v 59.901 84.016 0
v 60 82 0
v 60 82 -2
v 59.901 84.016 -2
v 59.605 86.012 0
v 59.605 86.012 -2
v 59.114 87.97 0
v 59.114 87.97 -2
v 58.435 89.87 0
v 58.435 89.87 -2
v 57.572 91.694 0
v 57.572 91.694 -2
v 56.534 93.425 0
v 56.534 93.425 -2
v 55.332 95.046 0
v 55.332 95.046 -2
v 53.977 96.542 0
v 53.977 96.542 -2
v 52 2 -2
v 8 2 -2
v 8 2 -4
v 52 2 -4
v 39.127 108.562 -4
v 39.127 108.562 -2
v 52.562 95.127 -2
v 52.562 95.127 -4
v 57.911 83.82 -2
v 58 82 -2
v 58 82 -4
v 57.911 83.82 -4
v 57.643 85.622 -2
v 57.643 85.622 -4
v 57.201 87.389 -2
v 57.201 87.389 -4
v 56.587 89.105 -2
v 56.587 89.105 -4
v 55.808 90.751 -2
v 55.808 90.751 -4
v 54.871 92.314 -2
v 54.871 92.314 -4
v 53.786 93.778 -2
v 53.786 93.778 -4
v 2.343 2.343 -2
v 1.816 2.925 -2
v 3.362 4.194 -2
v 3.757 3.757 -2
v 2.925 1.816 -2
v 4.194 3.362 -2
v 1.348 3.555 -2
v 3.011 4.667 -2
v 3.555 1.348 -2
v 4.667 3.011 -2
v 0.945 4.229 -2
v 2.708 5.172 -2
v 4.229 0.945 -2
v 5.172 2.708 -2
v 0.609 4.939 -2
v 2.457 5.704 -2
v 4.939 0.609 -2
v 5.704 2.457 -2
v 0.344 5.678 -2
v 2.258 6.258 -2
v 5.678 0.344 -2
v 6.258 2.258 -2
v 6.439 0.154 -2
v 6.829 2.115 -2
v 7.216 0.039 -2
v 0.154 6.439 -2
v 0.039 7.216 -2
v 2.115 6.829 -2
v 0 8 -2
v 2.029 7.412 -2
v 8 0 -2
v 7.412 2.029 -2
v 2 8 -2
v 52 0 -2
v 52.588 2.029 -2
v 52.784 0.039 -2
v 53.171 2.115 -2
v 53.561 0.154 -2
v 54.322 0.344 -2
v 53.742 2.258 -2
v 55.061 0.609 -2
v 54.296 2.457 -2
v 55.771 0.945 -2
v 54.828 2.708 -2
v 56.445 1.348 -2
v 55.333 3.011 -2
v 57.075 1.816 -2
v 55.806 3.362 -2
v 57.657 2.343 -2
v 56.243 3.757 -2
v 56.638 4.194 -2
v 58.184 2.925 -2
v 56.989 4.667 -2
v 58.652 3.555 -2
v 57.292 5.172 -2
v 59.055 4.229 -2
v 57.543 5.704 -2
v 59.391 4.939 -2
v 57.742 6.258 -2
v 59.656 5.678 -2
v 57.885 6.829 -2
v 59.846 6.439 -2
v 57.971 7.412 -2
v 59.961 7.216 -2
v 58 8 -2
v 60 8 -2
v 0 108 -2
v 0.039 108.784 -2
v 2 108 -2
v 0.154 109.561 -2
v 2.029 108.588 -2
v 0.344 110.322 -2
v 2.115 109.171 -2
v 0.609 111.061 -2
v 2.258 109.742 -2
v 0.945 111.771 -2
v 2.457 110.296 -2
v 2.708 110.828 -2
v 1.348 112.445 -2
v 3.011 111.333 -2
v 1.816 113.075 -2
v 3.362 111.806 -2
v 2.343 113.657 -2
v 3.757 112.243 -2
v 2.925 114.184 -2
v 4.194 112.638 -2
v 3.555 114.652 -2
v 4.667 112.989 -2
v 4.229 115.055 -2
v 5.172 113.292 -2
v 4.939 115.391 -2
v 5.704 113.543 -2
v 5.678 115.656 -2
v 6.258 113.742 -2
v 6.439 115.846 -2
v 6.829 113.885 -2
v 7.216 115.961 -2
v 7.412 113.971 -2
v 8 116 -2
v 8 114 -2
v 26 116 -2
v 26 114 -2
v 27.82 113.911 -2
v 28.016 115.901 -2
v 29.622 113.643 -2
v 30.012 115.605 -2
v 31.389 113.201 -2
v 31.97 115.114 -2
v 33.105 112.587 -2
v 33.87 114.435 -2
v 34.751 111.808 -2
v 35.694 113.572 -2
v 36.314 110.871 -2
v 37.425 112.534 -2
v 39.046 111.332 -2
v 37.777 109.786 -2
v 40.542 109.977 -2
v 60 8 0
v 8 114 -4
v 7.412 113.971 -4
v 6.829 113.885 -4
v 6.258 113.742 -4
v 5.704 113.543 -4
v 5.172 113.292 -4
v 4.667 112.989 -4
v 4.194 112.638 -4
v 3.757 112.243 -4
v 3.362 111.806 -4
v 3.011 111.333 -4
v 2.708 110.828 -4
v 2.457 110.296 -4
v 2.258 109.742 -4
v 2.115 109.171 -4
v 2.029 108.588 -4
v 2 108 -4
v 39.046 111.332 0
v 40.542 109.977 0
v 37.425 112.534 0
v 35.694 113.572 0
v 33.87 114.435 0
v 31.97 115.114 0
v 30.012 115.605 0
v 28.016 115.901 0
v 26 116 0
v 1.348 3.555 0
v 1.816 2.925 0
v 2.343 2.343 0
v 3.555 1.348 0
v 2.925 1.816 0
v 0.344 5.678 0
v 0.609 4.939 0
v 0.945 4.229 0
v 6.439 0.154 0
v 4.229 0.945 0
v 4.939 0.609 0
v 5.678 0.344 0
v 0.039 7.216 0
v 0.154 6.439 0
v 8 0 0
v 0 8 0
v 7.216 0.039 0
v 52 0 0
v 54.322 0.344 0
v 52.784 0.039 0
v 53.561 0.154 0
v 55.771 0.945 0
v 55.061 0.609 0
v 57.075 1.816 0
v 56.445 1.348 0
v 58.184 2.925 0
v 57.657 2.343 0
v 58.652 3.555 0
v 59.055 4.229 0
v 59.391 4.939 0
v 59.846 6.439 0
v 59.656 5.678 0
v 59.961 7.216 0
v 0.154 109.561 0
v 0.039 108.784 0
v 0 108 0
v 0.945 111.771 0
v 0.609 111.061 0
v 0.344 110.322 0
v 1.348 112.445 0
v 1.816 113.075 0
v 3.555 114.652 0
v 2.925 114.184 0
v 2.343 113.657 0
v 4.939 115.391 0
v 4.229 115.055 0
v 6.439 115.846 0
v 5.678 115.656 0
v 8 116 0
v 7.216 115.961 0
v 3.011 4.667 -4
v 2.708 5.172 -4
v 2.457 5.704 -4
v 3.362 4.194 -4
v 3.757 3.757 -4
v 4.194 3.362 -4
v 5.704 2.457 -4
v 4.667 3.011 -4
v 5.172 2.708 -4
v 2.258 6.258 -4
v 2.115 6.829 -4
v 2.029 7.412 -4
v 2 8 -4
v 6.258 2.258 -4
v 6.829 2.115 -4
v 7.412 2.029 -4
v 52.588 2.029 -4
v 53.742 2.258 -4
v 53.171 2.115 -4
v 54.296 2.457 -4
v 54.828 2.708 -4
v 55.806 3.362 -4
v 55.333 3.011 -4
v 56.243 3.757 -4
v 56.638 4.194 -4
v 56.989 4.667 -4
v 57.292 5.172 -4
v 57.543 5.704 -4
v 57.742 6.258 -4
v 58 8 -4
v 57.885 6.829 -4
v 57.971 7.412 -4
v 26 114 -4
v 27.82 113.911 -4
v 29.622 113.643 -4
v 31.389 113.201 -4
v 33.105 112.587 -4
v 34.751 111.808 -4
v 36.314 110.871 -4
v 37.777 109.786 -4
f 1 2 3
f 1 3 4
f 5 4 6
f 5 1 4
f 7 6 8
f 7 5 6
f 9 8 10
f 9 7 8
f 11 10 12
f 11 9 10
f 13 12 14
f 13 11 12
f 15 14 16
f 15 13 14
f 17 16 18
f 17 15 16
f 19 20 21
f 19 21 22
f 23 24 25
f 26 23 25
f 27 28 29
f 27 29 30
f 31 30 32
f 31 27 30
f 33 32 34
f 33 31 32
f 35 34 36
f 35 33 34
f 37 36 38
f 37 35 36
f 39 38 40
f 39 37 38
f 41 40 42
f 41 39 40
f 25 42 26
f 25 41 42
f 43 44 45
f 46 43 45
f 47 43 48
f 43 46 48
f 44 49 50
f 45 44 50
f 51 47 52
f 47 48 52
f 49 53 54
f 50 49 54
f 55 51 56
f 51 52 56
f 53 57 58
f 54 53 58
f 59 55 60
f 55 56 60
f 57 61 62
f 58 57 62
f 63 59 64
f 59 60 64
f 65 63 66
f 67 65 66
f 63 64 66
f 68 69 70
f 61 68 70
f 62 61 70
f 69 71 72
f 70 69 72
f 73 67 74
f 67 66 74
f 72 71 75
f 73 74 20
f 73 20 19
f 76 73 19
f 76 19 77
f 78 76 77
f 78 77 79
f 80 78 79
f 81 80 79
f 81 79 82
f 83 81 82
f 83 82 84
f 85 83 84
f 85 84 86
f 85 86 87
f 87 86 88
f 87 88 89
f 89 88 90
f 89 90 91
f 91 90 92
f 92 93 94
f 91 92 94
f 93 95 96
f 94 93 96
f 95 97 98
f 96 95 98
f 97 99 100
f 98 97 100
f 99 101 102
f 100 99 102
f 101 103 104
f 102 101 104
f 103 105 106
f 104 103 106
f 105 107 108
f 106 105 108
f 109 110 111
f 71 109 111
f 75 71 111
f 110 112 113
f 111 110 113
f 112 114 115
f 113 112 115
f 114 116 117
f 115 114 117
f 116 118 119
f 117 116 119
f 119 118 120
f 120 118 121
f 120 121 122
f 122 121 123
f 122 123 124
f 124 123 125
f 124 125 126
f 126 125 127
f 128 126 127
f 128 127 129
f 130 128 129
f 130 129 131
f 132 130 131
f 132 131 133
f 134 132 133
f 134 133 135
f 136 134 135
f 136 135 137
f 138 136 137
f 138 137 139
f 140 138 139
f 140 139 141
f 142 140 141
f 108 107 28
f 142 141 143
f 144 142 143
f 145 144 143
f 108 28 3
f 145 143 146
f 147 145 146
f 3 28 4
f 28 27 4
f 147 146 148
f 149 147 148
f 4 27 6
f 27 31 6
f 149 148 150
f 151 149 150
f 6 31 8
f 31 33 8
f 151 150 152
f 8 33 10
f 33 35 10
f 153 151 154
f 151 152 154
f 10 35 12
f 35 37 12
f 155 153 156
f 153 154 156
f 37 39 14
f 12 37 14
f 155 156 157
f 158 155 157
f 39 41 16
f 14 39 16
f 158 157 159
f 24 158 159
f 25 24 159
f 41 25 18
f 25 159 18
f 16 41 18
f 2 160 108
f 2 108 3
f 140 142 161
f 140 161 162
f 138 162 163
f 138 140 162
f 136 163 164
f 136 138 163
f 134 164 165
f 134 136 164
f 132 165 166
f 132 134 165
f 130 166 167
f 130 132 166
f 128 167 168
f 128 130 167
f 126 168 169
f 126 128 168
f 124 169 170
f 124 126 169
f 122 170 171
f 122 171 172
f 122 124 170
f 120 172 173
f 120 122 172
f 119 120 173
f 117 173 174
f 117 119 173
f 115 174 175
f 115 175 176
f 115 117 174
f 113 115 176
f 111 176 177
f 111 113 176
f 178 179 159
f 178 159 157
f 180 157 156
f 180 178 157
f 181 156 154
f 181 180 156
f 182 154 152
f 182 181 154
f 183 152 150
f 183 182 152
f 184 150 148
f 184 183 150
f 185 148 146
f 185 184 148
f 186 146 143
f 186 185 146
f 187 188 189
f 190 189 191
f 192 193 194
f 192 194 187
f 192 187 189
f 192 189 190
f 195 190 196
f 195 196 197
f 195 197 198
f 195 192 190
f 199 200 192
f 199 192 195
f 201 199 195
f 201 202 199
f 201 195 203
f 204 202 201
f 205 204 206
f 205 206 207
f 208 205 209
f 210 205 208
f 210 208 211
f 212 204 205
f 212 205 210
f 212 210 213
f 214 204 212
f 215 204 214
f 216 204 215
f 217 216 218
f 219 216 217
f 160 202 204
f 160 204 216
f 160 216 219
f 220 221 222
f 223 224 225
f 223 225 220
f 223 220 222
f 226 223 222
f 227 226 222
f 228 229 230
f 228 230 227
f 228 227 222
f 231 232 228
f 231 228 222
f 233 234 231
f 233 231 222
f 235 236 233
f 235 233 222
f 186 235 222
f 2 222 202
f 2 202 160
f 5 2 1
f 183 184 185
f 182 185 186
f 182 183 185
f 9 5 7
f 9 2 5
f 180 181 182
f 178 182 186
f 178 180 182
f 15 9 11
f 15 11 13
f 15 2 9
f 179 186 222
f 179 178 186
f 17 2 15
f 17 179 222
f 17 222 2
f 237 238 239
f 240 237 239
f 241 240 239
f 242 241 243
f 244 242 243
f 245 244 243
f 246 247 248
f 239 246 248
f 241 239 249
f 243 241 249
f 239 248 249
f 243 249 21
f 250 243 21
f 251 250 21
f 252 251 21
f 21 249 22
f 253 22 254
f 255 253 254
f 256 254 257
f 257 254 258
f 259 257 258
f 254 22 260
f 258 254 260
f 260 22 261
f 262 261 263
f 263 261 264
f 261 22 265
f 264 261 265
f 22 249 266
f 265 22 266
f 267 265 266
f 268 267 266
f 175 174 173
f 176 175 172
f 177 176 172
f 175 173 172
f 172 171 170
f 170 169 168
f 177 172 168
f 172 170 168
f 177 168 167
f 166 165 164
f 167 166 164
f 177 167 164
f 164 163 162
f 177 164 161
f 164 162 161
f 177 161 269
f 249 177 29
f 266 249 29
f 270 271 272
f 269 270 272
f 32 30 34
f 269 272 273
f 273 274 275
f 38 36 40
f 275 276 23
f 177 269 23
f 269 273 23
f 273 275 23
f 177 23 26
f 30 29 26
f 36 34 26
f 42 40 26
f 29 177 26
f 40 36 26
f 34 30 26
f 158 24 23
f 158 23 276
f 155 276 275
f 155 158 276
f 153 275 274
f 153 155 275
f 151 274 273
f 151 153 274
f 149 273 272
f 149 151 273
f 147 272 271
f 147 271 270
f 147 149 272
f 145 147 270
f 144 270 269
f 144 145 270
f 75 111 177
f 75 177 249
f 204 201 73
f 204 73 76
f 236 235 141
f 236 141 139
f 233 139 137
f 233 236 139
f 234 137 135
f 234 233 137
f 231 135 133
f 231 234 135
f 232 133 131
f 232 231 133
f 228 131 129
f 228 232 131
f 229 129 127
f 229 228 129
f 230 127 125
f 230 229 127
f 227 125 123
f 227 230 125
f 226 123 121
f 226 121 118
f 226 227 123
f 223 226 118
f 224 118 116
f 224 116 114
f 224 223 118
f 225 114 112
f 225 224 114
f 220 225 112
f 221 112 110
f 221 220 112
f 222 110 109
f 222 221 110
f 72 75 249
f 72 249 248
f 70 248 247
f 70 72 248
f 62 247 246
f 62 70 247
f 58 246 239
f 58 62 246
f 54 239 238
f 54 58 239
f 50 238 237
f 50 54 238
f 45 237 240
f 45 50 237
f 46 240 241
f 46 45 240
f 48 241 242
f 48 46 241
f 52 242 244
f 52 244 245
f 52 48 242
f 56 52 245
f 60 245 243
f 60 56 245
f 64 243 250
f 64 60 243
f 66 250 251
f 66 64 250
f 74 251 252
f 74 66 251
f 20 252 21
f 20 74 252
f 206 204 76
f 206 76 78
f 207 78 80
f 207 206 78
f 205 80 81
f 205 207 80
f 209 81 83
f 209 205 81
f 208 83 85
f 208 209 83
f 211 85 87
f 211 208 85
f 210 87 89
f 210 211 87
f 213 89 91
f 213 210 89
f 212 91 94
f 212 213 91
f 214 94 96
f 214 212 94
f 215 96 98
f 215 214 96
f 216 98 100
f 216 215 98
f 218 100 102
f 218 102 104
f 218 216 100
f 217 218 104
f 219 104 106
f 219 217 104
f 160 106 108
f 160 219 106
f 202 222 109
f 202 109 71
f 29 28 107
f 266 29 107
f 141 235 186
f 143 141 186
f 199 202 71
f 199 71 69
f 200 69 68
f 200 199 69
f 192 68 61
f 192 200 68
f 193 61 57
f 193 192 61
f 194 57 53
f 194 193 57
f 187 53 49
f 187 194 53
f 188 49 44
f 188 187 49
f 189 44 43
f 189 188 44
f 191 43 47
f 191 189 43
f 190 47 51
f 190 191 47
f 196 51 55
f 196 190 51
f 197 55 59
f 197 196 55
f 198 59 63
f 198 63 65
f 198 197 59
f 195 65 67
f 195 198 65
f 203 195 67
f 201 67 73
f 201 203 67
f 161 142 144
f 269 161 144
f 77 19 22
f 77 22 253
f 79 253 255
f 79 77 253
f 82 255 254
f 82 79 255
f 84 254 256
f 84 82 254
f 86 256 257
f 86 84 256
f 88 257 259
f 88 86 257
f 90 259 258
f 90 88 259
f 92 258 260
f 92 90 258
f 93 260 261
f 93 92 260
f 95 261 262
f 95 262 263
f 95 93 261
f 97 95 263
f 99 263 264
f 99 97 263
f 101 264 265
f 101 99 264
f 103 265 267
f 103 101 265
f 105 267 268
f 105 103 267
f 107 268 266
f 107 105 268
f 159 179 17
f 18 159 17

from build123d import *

# Parameters (mm, degrees)
PAD_DEPTH    = 2
PAD001_DEPTH = 2


with BuildPart() as pad001:
    # Sketch → Pad (new body)
    with BuildSketch(Plane.XY):
        with BuildLine():
            Line((60, 8), (60, 82.000001))
            ThreePointArc((60, 82.000001), (58.434586, 89.869877), (53.976662, 96.541638))
            Line((40.541631, 109.976664), (53.976662, 96.541638))
            ThreePointArc((40.541631, 109.976664), (33.869872, 114.434584), (25.999999, 115.999997))
            Line((7.999999, 115.999997), (25.999999, 115.999997))
            ThreePointArc((7.999999, 115.999997), (2.343146, 113.656851), (0, 107.999998))
            Line((0, 107.999998), (0, 8))
            ThreePointArc((0, 8), (2.343146, 2.343146), (8, 0))
            Line((8, 0), (52, 0))
            ThreePointArc((52, 0), (57.656854, 2.343146), (60, 8))
        make_face()
    extrude(amount=PAD_DEPTH)

    # Sketch001 → Pad001 (new body)
    with BuildSketch(Plane.XY.offset(2)):
        with BuildLine():
            ThreePointArc((8.00001, 113.999998), (3.757363, 112.242642), (2, 107.999998))
            Line((2, 107.999998), (2, 8))
            ThreePointArc((2, 8), (3.757359, 3.757359), (8, 2))
            Line((8, 2), (52, 2))
            ThreePointArc((52, 2), (56.242642, 3.757359), (58.000001, 8))
            Line((58.000001, 82), (58.000001, 8))
            ThreePointArc((58.000001, 82), (56.586824, 89.104519), (52.562435, 95.127438))
            Line((39.127419, 108.562437), (52.562435, 95.127438))
            ThreePointArc((39.127419, 108.562437), (33.104503, 112.586822), (25.99999, 113.999998))
            Line((8.00001, 113.999998), (25.99999, 113.999998))
        make_face()
    extrude(amount=PAD001_DEPTH)


with BuildPart() as part_mirroring:
    # Part__Mirroring: instance of Pad001
    add(pad001.part.mirror(Plane(origin=(0, 0, 0), x_dir=(0, 1, 0), z_dir=(0, 0, 1))))


solid = part_mirroring.part
